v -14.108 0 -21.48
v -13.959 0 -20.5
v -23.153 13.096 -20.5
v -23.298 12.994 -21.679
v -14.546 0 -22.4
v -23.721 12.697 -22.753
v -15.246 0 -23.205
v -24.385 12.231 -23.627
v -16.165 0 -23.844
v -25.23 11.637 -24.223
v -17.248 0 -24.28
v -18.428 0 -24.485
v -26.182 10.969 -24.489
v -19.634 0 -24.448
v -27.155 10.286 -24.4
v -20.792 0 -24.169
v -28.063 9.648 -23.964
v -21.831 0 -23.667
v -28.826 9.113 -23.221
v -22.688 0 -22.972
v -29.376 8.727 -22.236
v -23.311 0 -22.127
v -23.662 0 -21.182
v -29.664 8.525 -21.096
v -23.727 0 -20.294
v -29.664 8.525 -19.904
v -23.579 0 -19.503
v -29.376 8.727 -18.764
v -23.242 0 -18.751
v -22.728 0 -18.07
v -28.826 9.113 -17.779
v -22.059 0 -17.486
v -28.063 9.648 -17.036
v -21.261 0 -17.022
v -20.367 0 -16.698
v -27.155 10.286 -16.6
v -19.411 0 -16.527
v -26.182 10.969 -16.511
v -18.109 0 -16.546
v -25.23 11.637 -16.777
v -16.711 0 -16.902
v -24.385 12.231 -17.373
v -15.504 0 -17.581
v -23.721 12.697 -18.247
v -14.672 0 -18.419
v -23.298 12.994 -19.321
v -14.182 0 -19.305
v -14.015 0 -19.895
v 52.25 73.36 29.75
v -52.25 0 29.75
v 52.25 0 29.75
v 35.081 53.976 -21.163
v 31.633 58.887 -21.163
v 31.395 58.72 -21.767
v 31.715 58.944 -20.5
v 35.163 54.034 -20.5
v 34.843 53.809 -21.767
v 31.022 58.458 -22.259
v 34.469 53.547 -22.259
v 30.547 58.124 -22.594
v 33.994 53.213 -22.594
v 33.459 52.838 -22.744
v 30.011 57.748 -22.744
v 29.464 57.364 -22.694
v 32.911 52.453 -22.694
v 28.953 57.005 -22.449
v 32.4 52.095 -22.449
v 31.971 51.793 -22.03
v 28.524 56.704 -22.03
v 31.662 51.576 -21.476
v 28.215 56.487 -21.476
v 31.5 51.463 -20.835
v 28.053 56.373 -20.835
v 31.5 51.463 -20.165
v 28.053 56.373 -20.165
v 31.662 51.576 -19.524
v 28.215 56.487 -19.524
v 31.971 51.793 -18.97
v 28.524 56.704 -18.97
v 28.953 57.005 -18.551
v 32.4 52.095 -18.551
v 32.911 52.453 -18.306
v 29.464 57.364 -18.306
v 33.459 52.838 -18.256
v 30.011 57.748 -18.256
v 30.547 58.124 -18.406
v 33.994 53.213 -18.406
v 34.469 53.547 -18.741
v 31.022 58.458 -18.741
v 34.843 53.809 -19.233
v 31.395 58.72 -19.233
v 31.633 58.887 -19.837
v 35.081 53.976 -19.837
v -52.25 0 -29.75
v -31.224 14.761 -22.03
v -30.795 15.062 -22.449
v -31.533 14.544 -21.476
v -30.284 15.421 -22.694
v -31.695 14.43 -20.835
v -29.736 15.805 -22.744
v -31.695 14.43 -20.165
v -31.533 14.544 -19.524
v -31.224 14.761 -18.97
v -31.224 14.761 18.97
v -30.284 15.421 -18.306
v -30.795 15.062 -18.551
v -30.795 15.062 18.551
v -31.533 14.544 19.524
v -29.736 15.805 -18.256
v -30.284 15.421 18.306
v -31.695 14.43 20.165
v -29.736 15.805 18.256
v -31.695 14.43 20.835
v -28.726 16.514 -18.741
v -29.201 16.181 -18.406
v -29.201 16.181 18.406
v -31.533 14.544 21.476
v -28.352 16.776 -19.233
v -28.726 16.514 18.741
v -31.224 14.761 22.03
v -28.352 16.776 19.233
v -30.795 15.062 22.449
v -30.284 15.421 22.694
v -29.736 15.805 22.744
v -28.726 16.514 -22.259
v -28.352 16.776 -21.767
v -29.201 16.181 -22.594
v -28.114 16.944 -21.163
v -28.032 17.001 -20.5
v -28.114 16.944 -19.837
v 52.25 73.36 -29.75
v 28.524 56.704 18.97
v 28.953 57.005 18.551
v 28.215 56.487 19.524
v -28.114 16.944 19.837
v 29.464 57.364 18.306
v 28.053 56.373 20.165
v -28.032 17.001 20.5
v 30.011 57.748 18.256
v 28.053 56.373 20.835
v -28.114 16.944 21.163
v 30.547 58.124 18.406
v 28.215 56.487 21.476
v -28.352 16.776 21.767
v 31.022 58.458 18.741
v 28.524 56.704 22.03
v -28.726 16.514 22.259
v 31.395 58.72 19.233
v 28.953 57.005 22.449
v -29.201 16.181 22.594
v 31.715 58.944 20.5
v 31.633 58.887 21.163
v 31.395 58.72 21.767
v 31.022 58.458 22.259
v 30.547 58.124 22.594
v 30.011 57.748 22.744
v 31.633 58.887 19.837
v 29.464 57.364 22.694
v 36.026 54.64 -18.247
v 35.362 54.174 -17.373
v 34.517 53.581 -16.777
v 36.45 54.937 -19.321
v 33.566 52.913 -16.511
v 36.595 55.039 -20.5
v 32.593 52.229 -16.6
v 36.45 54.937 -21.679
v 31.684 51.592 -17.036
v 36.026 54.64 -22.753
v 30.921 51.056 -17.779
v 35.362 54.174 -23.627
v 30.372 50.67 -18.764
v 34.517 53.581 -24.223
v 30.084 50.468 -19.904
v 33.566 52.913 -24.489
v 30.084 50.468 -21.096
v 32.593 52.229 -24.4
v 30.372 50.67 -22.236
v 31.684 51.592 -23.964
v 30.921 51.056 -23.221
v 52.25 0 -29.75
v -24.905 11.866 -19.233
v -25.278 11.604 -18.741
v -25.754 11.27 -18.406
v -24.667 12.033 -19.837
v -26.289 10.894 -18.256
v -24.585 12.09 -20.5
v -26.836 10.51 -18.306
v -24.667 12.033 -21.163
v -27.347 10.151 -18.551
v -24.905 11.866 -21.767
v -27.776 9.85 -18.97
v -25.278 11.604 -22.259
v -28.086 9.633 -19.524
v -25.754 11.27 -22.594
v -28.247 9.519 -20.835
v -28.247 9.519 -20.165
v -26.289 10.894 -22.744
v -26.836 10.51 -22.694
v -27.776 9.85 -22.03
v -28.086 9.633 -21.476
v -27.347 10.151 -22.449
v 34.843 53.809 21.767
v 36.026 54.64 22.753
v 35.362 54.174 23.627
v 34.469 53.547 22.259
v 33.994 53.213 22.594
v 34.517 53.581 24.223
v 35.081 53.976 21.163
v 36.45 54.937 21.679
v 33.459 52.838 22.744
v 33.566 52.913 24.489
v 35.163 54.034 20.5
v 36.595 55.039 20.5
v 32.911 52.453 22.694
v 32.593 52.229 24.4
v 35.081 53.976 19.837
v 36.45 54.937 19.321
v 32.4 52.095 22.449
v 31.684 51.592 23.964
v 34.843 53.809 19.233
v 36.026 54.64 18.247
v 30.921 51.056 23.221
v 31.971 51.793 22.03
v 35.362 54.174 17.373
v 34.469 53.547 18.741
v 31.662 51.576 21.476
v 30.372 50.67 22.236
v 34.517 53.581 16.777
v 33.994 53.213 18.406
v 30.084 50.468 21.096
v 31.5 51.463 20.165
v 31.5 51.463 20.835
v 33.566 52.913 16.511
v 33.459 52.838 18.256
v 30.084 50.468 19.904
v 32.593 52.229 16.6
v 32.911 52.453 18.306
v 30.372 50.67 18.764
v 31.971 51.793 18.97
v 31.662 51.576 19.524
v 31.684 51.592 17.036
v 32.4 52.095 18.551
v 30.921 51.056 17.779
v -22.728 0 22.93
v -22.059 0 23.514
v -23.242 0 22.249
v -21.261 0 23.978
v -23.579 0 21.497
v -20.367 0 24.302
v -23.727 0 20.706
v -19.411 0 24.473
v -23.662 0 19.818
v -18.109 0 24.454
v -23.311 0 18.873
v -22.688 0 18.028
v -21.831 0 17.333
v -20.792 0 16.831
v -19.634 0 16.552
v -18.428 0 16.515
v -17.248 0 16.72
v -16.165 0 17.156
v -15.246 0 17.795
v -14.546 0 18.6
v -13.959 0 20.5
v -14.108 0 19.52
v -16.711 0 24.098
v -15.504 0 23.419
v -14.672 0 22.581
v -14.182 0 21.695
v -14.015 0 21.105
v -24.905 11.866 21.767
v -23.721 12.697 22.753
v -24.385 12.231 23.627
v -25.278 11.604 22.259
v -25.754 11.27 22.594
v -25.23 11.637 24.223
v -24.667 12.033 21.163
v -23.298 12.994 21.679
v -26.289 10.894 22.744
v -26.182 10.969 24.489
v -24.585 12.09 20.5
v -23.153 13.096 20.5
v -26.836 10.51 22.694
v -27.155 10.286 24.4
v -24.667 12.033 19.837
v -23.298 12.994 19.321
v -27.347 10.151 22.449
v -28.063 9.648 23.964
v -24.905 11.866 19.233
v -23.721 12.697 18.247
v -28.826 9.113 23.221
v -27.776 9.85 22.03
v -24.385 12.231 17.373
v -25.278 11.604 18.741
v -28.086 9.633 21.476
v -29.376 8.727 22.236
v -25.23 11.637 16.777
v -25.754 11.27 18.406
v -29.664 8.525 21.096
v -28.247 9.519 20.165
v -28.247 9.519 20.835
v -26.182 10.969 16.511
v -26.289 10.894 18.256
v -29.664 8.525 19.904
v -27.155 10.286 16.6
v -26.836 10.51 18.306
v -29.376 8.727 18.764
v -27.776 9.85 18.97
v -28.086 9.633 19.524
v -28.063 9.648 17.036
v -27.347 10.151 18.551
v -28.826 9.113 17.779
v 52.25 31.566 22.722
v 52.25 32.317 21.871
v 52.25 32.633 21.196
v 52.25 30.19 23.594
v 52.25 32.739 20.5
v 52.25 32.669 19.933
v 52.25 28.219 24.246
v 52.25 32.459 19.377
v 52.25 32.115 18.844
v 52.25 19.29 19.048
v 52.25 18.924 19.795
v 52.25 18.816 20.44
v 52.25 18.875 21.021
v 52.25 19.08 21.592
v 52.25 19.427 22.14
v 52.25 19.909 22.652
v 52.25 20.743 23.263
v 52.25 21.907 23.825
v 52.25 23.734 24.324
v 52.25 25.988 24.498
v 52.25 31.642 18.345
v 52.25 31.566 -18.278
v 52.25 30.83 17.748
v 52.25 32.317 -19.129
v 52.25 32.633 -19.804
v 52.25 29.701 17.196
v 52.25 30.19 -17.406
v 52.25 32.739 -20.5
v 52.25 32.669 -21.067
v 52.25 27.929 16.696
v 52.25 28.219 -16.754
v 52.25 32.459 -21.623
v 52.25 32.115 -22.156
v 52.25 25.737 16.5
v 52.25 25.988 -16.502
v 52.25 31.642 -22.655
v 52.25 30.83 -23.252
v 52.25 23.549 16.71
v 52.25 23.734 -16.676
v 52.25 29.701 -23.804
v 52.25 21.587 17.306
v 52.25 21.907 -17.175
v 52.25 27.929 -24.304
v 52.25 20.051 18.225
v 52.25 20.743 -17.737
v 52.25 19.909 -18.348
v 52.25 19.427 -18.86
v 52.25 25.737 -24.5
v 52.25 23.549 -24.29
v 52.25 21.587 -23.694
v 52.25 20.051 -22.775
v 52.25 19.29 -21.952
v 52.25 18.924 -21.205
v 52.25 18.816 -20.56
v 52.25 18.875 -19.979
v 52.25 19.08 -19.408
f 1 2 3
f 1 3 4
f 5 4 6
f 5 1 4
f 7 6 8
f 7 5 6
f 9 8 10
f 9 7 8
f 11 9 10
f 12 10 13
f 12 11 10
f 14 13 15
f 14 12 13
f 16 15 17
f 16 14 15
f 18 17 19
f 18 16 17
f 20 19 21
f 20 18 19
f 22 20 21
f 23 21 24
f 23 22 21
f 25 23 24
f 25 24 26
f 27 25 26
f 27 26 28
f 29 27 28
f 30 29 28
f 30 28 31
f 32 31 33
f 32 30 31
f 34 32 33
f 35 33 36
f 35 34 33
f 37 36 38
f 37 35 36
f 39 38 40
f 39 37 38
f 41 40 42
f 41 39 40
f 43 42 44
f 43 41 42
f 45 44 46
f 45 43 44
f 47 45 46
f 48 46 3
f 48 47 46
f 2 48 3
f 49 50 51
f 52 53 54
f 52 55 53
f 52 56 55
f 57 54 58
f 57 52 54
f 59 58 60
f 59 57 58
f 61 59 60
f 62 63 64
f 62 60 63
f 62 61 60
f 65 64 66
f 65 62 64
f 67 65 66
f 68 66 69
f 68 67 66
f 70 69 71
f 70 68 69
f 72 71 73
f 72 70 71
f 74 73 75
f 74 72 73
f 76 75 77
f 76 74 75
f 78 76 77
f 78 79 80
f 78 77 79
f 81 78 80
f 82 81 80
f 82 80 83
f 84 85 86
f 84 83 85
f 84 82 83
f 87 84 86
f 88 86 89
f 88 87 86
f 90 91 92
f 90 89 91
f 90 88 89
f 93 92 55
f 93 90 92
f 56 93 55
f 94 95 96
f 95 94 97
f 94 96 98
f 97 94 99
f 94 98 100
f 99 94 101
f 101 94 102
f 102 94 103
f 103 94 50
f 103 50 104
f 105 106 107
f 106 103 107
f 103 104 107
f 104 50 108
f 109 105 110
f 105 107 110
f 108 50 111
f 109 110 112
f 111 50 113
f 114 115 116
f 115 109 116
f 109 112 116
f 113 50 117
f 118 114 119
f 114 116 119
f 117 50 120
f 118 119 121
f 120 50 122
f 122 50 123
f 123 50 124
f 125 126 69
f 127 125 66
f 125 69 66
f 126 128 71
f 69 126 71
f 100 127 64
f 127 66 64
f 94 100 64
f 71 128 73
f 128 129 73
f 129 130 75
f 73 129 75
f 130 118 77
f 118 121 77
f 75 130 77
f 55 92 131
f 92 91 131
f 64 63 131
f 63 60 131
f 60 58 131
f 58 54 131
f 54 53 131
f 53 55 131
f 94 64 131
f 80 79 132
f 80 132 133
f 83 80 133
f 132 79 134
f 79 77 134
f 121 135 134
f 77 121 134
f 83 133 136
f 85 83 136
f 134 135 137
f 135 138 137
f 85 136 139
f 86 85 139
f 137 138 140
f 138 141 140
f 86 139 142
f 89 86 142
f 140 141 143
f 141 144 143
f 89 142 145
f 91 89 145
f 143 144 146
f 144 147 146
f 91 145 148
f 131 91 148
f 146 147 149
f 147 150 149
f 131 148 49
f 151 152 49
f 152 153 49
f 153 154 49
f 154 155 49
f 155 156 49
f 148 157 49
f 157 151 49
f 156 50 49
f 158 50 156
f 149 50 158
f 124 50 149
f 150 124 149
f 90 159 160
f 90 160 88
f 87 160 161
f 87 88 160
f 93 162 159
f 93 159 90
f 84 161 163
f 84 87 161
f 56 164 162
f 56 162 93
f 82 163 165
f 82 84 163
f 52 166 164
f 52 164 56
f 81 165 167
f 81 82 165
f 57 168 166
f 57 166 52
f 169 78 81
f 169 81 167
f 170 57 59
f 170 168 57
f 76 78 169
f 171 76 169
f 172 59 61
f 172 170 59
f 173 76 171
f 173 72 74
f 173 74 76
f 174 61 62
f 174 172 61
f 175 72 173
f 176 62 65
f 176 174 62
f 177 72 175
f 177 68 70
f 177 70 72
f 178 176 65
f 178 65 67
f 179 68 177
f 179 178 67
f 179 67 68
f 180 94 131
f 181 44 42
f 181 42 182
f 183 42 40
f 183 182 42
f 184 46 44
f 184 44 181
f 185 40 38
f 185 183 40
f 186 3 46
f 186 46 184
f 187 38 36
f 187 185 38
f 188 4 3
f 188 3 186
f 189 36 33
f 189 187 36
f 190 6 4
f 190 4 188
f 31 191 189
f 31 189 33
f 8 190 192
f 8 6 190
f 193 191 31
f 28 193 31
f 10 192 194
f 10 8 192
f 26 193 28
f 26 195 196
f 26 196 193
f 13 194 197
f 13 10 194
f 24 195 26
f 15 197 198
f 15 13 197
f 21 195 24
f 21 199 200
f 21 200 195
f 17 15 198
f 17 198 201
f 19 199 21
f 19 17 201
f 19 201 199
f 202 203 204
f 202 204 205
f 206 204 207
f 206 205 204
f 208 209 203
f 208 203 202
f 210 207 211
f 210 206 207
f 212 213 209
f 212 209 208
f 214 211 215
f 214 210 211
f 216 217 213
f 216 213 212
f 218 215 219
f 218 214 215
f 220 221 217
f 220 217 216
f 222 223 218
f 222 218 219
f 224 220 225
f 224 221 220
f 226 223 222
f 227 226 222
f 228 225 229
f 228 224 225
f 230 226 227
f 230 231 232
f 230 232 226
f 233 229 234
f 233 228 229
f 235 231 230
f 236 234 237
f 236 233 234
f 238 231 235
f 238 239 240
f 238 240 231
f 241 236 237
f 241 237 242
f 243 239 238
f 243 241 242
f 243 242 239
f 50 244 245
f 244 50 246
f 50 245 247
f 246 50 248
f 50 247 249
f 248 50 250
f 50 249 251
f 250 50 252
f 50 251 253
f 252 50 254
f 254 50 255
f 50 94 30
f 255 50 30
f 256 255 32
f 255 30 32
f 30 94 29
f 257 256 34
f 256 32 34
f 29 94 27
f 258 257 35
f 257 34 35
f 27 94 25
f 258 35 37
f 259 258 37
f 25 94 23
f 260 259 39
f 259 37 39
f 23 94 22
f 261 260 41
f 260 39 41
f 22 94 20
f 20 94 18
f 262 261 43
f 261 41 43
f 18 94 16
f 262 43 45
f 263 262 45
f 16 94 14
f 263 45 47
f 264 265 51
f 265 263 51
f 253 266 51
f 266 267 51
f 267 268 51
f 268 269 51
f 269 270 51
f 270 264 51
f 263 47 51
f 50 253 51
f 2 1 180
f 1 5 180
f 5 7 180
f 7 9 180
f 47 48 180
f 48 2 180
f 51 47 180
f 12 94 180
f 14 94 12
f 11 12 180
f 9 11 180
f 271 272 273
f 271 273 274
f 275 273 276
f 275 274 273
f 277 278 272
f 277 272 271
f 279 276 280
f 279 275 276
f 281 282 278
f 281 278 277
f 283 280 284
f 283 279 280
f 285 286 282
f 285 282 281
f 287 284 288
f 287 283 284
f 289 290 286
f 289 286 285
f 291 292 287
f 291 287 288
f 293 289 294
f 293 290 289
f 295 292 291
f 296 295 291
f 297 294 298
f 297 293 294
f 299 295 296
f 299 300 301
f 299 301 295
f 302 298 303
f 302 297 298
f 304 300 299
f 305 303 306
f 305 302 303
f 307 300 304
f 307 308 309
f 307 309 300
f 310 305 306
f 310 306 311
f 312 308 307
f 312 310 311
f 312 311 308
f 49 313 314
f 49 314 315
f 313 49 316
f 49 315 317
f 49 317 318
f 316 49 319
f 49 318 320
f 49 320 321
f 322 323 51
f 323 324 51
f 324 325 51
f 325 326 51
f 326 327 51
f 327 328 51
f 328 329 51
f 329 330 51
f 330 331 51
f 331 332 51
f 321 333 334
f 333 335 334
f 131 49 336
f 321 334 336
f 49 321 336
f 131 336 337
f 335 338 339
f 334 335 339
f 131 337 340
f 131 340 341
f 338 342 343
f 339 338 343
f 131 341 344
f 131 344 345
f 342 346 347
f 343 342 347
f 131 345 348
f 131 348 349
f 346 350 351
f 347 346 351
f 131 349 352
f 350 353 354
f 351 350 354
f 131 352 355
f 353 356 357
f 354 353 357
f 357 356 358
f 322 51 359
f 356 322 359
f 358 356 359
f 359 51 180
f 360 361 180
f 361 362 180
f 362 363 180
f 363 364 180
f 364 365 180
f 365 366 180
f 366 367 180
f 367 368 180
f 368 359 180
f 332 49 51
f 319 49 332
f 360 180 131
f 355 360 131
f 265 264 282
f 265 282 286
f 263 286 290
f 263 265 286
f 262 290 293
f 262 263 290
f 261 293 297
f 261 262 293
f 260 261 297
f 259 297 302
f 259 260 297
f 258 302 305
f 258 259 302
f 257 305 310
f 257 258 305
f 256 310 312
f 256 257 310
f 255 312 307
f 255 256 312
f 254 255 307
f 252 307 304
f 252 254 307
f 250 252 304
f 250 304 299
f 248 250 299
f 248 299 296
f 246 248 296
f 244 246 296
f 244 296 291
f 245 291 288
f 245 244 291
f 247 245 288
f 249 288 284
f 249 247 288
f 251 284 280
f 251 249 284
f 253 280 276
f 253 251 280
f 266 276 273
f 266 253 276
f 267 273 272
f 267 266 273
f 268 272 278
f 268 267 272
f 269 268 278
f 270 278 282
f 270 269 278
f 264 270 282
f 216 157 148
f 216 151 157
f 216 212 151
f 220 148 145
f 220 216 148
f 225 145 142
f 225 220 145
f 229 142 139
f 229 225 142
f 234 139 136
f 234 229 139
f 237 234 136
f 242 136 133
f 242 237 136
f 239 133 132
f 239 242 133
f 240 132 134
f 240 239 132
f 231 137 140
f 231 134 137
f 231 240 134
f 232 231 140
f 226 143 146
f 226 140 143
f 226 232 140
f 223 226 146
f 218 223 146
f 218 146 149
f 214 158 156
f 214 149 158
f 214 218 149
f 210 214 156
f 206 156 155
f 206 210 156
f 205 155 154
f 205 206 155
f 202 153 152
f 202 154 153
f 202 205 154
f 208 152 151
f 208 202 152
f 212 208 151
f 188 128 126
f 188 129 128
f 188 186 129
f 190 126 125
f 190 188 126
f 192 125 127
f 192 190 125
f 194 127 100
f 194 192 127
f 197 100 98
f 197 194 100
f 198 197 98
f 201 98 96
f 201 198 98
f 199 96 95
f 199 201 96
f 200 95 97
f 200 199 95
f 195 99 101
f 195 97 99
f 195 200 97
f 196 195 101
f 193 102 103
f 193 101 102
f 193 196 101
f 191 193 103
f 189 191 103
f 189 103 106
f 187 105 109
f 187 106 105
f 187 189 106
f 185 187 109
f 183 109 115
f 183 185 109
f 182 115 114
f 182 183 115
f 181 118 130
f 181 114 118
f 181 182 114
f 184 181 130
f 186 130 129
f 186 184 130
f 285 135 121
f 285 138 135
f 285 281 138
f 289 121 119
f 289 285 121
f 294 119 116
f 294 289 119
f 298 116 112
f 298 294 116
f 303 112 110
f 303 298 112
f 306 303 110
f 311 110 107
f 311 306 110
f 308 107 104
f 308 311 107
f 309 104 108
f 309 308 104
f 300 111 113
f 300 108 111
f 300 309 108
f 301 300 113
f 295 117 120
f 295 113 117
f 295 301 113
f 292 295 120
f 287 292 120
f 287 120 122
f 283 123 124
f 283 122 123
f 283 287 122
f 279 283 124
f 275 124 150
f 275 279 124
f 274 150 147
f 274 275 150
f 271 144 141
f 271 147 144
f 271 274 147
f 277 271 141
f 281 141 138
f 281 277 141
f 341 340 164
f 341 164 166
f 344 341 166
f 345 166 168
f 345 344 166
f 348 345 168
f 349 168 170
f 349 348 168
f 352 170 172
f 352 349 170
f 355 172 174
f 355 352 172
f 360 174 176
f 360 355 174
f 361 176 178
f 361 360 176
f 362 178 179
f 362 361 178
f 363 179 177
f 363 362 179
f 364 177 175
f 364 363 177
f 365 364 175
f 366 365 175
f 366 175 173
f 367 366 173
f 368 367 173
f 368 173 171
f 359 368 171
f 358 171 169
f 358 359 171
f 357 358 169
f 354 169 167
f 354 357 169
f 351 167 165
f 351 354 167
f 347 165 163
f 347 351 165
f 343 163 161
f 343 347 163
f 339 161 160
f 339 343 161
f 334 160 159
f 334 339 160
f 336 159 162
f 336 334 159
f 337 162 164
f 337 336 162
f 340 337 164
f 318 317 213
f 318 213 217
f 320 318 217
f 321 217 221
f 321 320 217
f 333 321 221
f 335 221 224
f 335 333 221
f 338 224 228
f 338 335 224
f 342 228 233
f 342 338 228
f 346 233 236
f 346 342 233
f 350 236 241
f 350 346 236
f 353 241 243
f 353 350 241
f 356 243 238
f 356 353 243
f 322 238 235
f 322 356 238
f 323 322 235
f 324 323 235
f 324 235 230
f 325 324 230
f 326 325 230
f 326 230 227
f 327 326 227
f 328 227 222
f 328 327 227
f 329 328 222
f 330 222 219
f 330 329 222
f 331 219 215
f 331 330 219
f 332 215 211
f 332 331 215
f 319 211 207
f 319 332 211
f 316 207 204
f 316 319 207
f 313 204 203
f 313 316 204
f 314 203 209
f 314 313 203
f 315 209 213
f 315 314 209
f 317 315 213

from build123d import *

# Parameters (mm, degrees)
SKETCH1_W                     = 104.5
SKETCH1_H                     = 59.5
BOSS_EXTRUDE1_DEPTH           = 73.36
CUT_EXTRUDE2_DEPTH            = 108.944439875
CBORE_FOR_M4_SHCS1_AT_2_COUNT = 2
CBORE_FOR_M4_SHCS1_AT_2_PITCH = 73
CBORE_FOR_M4_SHCS1_AT_3_COUNT = 2
CBORE_FOR_M4_SHCS1_AT_3_PITCH = 83.725742756
CBORE_FOR_M4_SHCS1_AT_4_COUNT = 2
CBORE_FOR_M4_SHCS1_AT_4_PITCH = 41


with BuildPart() as part:
    # Sketch1 → Boss-Extrude1 (new body)
    with BuildSketch(Plane(origin=(0, 0, 0), x_dir=(1, 0, 0), z_dir=(0, 1, 0))):
        Rectangle(SKETCH1_W, SKETCH1_H)
    extrude(amount=BOSS_EXTRUDE1_DEPTH)

    # Sketch6 → Cut-Extrude2 (cut, through all)
    with BuildSketch(Plane.XY.offset(29.75)):
        Polygon((-52.25, 0), (52.25, 73.36), (-52.25, 73.36), align=None)
    extrude(amount=-CUT_EXTRUDE2_DEPTH, mode=Mode.SUBTRACT)

    # Sketch9 → CBORE for M4 SHCS1 (revolve, cut)
    with BuildSketch(Plane(origin=(-1.145450259, -25.214571197, -20.5), x_dir=(0.8184584759172453, 0.5745656822324319, 0), z_dir=(0, 0, 1))):
        Polygon((0, 0), (0, 110.042113793), (2.25, 110.042113793), (2.25, 44), (4, 44), (4, 0.020977491), (4.025, 0), align=None)
    cbore_for_m4_shcs1 = revolve(axis=Axis((2.503041823, -30.411782519, -20.5), (-0.5745656822324319, 0.8184584759172453, 0)), mode=Mode.SUBTRACT)

    # CBORE for M4 SHCS1 at 2: CBORE for M4 SHCS1 ×2
    with Locations(*[Vector(0.8184584759172454, 0.5745656822324319, 0) * (i * CBORE_FOR_M4_SHCS1_AT_2_PITCH) for i in range(1, CBORE_FOR_M4_SHCS1_AT_2_COUNT)]):
        add(cbore_for_m4_shcs1, mode=Mode.SUBTRACT)

    # CBORE for M4 SHCS1 at 3: CBORE for M4 SHCS1 ×2
    with Locations(*[Vector(0.7136093007411902, 0.5009605579174519, 0.48969407317906627) * (i * CBORE_FOR_M4_SHCS1_AT_3_PITCH) for i in range(1, CBORE_FOR_M4_SHCS1_AT_3_COUNT)]):
        add(cbore_for_m4_shcs1, mode=Mode.SUBTRACT)

    # CBORE for M4 SHCS1 at 4: CBORE for M4 SHCS1 ×2
    with Locations(*[(0, 0, i * CBORE_FOR_M4_SHCS1_AT_4_PITCH) for i in range(1, CBORE_FOR_M4_SHCS1_AT_4_COUNT)]):
        add(cbore_for_m4_shcs1, mode=Mode.SUBTRACT)


solid = part.part
